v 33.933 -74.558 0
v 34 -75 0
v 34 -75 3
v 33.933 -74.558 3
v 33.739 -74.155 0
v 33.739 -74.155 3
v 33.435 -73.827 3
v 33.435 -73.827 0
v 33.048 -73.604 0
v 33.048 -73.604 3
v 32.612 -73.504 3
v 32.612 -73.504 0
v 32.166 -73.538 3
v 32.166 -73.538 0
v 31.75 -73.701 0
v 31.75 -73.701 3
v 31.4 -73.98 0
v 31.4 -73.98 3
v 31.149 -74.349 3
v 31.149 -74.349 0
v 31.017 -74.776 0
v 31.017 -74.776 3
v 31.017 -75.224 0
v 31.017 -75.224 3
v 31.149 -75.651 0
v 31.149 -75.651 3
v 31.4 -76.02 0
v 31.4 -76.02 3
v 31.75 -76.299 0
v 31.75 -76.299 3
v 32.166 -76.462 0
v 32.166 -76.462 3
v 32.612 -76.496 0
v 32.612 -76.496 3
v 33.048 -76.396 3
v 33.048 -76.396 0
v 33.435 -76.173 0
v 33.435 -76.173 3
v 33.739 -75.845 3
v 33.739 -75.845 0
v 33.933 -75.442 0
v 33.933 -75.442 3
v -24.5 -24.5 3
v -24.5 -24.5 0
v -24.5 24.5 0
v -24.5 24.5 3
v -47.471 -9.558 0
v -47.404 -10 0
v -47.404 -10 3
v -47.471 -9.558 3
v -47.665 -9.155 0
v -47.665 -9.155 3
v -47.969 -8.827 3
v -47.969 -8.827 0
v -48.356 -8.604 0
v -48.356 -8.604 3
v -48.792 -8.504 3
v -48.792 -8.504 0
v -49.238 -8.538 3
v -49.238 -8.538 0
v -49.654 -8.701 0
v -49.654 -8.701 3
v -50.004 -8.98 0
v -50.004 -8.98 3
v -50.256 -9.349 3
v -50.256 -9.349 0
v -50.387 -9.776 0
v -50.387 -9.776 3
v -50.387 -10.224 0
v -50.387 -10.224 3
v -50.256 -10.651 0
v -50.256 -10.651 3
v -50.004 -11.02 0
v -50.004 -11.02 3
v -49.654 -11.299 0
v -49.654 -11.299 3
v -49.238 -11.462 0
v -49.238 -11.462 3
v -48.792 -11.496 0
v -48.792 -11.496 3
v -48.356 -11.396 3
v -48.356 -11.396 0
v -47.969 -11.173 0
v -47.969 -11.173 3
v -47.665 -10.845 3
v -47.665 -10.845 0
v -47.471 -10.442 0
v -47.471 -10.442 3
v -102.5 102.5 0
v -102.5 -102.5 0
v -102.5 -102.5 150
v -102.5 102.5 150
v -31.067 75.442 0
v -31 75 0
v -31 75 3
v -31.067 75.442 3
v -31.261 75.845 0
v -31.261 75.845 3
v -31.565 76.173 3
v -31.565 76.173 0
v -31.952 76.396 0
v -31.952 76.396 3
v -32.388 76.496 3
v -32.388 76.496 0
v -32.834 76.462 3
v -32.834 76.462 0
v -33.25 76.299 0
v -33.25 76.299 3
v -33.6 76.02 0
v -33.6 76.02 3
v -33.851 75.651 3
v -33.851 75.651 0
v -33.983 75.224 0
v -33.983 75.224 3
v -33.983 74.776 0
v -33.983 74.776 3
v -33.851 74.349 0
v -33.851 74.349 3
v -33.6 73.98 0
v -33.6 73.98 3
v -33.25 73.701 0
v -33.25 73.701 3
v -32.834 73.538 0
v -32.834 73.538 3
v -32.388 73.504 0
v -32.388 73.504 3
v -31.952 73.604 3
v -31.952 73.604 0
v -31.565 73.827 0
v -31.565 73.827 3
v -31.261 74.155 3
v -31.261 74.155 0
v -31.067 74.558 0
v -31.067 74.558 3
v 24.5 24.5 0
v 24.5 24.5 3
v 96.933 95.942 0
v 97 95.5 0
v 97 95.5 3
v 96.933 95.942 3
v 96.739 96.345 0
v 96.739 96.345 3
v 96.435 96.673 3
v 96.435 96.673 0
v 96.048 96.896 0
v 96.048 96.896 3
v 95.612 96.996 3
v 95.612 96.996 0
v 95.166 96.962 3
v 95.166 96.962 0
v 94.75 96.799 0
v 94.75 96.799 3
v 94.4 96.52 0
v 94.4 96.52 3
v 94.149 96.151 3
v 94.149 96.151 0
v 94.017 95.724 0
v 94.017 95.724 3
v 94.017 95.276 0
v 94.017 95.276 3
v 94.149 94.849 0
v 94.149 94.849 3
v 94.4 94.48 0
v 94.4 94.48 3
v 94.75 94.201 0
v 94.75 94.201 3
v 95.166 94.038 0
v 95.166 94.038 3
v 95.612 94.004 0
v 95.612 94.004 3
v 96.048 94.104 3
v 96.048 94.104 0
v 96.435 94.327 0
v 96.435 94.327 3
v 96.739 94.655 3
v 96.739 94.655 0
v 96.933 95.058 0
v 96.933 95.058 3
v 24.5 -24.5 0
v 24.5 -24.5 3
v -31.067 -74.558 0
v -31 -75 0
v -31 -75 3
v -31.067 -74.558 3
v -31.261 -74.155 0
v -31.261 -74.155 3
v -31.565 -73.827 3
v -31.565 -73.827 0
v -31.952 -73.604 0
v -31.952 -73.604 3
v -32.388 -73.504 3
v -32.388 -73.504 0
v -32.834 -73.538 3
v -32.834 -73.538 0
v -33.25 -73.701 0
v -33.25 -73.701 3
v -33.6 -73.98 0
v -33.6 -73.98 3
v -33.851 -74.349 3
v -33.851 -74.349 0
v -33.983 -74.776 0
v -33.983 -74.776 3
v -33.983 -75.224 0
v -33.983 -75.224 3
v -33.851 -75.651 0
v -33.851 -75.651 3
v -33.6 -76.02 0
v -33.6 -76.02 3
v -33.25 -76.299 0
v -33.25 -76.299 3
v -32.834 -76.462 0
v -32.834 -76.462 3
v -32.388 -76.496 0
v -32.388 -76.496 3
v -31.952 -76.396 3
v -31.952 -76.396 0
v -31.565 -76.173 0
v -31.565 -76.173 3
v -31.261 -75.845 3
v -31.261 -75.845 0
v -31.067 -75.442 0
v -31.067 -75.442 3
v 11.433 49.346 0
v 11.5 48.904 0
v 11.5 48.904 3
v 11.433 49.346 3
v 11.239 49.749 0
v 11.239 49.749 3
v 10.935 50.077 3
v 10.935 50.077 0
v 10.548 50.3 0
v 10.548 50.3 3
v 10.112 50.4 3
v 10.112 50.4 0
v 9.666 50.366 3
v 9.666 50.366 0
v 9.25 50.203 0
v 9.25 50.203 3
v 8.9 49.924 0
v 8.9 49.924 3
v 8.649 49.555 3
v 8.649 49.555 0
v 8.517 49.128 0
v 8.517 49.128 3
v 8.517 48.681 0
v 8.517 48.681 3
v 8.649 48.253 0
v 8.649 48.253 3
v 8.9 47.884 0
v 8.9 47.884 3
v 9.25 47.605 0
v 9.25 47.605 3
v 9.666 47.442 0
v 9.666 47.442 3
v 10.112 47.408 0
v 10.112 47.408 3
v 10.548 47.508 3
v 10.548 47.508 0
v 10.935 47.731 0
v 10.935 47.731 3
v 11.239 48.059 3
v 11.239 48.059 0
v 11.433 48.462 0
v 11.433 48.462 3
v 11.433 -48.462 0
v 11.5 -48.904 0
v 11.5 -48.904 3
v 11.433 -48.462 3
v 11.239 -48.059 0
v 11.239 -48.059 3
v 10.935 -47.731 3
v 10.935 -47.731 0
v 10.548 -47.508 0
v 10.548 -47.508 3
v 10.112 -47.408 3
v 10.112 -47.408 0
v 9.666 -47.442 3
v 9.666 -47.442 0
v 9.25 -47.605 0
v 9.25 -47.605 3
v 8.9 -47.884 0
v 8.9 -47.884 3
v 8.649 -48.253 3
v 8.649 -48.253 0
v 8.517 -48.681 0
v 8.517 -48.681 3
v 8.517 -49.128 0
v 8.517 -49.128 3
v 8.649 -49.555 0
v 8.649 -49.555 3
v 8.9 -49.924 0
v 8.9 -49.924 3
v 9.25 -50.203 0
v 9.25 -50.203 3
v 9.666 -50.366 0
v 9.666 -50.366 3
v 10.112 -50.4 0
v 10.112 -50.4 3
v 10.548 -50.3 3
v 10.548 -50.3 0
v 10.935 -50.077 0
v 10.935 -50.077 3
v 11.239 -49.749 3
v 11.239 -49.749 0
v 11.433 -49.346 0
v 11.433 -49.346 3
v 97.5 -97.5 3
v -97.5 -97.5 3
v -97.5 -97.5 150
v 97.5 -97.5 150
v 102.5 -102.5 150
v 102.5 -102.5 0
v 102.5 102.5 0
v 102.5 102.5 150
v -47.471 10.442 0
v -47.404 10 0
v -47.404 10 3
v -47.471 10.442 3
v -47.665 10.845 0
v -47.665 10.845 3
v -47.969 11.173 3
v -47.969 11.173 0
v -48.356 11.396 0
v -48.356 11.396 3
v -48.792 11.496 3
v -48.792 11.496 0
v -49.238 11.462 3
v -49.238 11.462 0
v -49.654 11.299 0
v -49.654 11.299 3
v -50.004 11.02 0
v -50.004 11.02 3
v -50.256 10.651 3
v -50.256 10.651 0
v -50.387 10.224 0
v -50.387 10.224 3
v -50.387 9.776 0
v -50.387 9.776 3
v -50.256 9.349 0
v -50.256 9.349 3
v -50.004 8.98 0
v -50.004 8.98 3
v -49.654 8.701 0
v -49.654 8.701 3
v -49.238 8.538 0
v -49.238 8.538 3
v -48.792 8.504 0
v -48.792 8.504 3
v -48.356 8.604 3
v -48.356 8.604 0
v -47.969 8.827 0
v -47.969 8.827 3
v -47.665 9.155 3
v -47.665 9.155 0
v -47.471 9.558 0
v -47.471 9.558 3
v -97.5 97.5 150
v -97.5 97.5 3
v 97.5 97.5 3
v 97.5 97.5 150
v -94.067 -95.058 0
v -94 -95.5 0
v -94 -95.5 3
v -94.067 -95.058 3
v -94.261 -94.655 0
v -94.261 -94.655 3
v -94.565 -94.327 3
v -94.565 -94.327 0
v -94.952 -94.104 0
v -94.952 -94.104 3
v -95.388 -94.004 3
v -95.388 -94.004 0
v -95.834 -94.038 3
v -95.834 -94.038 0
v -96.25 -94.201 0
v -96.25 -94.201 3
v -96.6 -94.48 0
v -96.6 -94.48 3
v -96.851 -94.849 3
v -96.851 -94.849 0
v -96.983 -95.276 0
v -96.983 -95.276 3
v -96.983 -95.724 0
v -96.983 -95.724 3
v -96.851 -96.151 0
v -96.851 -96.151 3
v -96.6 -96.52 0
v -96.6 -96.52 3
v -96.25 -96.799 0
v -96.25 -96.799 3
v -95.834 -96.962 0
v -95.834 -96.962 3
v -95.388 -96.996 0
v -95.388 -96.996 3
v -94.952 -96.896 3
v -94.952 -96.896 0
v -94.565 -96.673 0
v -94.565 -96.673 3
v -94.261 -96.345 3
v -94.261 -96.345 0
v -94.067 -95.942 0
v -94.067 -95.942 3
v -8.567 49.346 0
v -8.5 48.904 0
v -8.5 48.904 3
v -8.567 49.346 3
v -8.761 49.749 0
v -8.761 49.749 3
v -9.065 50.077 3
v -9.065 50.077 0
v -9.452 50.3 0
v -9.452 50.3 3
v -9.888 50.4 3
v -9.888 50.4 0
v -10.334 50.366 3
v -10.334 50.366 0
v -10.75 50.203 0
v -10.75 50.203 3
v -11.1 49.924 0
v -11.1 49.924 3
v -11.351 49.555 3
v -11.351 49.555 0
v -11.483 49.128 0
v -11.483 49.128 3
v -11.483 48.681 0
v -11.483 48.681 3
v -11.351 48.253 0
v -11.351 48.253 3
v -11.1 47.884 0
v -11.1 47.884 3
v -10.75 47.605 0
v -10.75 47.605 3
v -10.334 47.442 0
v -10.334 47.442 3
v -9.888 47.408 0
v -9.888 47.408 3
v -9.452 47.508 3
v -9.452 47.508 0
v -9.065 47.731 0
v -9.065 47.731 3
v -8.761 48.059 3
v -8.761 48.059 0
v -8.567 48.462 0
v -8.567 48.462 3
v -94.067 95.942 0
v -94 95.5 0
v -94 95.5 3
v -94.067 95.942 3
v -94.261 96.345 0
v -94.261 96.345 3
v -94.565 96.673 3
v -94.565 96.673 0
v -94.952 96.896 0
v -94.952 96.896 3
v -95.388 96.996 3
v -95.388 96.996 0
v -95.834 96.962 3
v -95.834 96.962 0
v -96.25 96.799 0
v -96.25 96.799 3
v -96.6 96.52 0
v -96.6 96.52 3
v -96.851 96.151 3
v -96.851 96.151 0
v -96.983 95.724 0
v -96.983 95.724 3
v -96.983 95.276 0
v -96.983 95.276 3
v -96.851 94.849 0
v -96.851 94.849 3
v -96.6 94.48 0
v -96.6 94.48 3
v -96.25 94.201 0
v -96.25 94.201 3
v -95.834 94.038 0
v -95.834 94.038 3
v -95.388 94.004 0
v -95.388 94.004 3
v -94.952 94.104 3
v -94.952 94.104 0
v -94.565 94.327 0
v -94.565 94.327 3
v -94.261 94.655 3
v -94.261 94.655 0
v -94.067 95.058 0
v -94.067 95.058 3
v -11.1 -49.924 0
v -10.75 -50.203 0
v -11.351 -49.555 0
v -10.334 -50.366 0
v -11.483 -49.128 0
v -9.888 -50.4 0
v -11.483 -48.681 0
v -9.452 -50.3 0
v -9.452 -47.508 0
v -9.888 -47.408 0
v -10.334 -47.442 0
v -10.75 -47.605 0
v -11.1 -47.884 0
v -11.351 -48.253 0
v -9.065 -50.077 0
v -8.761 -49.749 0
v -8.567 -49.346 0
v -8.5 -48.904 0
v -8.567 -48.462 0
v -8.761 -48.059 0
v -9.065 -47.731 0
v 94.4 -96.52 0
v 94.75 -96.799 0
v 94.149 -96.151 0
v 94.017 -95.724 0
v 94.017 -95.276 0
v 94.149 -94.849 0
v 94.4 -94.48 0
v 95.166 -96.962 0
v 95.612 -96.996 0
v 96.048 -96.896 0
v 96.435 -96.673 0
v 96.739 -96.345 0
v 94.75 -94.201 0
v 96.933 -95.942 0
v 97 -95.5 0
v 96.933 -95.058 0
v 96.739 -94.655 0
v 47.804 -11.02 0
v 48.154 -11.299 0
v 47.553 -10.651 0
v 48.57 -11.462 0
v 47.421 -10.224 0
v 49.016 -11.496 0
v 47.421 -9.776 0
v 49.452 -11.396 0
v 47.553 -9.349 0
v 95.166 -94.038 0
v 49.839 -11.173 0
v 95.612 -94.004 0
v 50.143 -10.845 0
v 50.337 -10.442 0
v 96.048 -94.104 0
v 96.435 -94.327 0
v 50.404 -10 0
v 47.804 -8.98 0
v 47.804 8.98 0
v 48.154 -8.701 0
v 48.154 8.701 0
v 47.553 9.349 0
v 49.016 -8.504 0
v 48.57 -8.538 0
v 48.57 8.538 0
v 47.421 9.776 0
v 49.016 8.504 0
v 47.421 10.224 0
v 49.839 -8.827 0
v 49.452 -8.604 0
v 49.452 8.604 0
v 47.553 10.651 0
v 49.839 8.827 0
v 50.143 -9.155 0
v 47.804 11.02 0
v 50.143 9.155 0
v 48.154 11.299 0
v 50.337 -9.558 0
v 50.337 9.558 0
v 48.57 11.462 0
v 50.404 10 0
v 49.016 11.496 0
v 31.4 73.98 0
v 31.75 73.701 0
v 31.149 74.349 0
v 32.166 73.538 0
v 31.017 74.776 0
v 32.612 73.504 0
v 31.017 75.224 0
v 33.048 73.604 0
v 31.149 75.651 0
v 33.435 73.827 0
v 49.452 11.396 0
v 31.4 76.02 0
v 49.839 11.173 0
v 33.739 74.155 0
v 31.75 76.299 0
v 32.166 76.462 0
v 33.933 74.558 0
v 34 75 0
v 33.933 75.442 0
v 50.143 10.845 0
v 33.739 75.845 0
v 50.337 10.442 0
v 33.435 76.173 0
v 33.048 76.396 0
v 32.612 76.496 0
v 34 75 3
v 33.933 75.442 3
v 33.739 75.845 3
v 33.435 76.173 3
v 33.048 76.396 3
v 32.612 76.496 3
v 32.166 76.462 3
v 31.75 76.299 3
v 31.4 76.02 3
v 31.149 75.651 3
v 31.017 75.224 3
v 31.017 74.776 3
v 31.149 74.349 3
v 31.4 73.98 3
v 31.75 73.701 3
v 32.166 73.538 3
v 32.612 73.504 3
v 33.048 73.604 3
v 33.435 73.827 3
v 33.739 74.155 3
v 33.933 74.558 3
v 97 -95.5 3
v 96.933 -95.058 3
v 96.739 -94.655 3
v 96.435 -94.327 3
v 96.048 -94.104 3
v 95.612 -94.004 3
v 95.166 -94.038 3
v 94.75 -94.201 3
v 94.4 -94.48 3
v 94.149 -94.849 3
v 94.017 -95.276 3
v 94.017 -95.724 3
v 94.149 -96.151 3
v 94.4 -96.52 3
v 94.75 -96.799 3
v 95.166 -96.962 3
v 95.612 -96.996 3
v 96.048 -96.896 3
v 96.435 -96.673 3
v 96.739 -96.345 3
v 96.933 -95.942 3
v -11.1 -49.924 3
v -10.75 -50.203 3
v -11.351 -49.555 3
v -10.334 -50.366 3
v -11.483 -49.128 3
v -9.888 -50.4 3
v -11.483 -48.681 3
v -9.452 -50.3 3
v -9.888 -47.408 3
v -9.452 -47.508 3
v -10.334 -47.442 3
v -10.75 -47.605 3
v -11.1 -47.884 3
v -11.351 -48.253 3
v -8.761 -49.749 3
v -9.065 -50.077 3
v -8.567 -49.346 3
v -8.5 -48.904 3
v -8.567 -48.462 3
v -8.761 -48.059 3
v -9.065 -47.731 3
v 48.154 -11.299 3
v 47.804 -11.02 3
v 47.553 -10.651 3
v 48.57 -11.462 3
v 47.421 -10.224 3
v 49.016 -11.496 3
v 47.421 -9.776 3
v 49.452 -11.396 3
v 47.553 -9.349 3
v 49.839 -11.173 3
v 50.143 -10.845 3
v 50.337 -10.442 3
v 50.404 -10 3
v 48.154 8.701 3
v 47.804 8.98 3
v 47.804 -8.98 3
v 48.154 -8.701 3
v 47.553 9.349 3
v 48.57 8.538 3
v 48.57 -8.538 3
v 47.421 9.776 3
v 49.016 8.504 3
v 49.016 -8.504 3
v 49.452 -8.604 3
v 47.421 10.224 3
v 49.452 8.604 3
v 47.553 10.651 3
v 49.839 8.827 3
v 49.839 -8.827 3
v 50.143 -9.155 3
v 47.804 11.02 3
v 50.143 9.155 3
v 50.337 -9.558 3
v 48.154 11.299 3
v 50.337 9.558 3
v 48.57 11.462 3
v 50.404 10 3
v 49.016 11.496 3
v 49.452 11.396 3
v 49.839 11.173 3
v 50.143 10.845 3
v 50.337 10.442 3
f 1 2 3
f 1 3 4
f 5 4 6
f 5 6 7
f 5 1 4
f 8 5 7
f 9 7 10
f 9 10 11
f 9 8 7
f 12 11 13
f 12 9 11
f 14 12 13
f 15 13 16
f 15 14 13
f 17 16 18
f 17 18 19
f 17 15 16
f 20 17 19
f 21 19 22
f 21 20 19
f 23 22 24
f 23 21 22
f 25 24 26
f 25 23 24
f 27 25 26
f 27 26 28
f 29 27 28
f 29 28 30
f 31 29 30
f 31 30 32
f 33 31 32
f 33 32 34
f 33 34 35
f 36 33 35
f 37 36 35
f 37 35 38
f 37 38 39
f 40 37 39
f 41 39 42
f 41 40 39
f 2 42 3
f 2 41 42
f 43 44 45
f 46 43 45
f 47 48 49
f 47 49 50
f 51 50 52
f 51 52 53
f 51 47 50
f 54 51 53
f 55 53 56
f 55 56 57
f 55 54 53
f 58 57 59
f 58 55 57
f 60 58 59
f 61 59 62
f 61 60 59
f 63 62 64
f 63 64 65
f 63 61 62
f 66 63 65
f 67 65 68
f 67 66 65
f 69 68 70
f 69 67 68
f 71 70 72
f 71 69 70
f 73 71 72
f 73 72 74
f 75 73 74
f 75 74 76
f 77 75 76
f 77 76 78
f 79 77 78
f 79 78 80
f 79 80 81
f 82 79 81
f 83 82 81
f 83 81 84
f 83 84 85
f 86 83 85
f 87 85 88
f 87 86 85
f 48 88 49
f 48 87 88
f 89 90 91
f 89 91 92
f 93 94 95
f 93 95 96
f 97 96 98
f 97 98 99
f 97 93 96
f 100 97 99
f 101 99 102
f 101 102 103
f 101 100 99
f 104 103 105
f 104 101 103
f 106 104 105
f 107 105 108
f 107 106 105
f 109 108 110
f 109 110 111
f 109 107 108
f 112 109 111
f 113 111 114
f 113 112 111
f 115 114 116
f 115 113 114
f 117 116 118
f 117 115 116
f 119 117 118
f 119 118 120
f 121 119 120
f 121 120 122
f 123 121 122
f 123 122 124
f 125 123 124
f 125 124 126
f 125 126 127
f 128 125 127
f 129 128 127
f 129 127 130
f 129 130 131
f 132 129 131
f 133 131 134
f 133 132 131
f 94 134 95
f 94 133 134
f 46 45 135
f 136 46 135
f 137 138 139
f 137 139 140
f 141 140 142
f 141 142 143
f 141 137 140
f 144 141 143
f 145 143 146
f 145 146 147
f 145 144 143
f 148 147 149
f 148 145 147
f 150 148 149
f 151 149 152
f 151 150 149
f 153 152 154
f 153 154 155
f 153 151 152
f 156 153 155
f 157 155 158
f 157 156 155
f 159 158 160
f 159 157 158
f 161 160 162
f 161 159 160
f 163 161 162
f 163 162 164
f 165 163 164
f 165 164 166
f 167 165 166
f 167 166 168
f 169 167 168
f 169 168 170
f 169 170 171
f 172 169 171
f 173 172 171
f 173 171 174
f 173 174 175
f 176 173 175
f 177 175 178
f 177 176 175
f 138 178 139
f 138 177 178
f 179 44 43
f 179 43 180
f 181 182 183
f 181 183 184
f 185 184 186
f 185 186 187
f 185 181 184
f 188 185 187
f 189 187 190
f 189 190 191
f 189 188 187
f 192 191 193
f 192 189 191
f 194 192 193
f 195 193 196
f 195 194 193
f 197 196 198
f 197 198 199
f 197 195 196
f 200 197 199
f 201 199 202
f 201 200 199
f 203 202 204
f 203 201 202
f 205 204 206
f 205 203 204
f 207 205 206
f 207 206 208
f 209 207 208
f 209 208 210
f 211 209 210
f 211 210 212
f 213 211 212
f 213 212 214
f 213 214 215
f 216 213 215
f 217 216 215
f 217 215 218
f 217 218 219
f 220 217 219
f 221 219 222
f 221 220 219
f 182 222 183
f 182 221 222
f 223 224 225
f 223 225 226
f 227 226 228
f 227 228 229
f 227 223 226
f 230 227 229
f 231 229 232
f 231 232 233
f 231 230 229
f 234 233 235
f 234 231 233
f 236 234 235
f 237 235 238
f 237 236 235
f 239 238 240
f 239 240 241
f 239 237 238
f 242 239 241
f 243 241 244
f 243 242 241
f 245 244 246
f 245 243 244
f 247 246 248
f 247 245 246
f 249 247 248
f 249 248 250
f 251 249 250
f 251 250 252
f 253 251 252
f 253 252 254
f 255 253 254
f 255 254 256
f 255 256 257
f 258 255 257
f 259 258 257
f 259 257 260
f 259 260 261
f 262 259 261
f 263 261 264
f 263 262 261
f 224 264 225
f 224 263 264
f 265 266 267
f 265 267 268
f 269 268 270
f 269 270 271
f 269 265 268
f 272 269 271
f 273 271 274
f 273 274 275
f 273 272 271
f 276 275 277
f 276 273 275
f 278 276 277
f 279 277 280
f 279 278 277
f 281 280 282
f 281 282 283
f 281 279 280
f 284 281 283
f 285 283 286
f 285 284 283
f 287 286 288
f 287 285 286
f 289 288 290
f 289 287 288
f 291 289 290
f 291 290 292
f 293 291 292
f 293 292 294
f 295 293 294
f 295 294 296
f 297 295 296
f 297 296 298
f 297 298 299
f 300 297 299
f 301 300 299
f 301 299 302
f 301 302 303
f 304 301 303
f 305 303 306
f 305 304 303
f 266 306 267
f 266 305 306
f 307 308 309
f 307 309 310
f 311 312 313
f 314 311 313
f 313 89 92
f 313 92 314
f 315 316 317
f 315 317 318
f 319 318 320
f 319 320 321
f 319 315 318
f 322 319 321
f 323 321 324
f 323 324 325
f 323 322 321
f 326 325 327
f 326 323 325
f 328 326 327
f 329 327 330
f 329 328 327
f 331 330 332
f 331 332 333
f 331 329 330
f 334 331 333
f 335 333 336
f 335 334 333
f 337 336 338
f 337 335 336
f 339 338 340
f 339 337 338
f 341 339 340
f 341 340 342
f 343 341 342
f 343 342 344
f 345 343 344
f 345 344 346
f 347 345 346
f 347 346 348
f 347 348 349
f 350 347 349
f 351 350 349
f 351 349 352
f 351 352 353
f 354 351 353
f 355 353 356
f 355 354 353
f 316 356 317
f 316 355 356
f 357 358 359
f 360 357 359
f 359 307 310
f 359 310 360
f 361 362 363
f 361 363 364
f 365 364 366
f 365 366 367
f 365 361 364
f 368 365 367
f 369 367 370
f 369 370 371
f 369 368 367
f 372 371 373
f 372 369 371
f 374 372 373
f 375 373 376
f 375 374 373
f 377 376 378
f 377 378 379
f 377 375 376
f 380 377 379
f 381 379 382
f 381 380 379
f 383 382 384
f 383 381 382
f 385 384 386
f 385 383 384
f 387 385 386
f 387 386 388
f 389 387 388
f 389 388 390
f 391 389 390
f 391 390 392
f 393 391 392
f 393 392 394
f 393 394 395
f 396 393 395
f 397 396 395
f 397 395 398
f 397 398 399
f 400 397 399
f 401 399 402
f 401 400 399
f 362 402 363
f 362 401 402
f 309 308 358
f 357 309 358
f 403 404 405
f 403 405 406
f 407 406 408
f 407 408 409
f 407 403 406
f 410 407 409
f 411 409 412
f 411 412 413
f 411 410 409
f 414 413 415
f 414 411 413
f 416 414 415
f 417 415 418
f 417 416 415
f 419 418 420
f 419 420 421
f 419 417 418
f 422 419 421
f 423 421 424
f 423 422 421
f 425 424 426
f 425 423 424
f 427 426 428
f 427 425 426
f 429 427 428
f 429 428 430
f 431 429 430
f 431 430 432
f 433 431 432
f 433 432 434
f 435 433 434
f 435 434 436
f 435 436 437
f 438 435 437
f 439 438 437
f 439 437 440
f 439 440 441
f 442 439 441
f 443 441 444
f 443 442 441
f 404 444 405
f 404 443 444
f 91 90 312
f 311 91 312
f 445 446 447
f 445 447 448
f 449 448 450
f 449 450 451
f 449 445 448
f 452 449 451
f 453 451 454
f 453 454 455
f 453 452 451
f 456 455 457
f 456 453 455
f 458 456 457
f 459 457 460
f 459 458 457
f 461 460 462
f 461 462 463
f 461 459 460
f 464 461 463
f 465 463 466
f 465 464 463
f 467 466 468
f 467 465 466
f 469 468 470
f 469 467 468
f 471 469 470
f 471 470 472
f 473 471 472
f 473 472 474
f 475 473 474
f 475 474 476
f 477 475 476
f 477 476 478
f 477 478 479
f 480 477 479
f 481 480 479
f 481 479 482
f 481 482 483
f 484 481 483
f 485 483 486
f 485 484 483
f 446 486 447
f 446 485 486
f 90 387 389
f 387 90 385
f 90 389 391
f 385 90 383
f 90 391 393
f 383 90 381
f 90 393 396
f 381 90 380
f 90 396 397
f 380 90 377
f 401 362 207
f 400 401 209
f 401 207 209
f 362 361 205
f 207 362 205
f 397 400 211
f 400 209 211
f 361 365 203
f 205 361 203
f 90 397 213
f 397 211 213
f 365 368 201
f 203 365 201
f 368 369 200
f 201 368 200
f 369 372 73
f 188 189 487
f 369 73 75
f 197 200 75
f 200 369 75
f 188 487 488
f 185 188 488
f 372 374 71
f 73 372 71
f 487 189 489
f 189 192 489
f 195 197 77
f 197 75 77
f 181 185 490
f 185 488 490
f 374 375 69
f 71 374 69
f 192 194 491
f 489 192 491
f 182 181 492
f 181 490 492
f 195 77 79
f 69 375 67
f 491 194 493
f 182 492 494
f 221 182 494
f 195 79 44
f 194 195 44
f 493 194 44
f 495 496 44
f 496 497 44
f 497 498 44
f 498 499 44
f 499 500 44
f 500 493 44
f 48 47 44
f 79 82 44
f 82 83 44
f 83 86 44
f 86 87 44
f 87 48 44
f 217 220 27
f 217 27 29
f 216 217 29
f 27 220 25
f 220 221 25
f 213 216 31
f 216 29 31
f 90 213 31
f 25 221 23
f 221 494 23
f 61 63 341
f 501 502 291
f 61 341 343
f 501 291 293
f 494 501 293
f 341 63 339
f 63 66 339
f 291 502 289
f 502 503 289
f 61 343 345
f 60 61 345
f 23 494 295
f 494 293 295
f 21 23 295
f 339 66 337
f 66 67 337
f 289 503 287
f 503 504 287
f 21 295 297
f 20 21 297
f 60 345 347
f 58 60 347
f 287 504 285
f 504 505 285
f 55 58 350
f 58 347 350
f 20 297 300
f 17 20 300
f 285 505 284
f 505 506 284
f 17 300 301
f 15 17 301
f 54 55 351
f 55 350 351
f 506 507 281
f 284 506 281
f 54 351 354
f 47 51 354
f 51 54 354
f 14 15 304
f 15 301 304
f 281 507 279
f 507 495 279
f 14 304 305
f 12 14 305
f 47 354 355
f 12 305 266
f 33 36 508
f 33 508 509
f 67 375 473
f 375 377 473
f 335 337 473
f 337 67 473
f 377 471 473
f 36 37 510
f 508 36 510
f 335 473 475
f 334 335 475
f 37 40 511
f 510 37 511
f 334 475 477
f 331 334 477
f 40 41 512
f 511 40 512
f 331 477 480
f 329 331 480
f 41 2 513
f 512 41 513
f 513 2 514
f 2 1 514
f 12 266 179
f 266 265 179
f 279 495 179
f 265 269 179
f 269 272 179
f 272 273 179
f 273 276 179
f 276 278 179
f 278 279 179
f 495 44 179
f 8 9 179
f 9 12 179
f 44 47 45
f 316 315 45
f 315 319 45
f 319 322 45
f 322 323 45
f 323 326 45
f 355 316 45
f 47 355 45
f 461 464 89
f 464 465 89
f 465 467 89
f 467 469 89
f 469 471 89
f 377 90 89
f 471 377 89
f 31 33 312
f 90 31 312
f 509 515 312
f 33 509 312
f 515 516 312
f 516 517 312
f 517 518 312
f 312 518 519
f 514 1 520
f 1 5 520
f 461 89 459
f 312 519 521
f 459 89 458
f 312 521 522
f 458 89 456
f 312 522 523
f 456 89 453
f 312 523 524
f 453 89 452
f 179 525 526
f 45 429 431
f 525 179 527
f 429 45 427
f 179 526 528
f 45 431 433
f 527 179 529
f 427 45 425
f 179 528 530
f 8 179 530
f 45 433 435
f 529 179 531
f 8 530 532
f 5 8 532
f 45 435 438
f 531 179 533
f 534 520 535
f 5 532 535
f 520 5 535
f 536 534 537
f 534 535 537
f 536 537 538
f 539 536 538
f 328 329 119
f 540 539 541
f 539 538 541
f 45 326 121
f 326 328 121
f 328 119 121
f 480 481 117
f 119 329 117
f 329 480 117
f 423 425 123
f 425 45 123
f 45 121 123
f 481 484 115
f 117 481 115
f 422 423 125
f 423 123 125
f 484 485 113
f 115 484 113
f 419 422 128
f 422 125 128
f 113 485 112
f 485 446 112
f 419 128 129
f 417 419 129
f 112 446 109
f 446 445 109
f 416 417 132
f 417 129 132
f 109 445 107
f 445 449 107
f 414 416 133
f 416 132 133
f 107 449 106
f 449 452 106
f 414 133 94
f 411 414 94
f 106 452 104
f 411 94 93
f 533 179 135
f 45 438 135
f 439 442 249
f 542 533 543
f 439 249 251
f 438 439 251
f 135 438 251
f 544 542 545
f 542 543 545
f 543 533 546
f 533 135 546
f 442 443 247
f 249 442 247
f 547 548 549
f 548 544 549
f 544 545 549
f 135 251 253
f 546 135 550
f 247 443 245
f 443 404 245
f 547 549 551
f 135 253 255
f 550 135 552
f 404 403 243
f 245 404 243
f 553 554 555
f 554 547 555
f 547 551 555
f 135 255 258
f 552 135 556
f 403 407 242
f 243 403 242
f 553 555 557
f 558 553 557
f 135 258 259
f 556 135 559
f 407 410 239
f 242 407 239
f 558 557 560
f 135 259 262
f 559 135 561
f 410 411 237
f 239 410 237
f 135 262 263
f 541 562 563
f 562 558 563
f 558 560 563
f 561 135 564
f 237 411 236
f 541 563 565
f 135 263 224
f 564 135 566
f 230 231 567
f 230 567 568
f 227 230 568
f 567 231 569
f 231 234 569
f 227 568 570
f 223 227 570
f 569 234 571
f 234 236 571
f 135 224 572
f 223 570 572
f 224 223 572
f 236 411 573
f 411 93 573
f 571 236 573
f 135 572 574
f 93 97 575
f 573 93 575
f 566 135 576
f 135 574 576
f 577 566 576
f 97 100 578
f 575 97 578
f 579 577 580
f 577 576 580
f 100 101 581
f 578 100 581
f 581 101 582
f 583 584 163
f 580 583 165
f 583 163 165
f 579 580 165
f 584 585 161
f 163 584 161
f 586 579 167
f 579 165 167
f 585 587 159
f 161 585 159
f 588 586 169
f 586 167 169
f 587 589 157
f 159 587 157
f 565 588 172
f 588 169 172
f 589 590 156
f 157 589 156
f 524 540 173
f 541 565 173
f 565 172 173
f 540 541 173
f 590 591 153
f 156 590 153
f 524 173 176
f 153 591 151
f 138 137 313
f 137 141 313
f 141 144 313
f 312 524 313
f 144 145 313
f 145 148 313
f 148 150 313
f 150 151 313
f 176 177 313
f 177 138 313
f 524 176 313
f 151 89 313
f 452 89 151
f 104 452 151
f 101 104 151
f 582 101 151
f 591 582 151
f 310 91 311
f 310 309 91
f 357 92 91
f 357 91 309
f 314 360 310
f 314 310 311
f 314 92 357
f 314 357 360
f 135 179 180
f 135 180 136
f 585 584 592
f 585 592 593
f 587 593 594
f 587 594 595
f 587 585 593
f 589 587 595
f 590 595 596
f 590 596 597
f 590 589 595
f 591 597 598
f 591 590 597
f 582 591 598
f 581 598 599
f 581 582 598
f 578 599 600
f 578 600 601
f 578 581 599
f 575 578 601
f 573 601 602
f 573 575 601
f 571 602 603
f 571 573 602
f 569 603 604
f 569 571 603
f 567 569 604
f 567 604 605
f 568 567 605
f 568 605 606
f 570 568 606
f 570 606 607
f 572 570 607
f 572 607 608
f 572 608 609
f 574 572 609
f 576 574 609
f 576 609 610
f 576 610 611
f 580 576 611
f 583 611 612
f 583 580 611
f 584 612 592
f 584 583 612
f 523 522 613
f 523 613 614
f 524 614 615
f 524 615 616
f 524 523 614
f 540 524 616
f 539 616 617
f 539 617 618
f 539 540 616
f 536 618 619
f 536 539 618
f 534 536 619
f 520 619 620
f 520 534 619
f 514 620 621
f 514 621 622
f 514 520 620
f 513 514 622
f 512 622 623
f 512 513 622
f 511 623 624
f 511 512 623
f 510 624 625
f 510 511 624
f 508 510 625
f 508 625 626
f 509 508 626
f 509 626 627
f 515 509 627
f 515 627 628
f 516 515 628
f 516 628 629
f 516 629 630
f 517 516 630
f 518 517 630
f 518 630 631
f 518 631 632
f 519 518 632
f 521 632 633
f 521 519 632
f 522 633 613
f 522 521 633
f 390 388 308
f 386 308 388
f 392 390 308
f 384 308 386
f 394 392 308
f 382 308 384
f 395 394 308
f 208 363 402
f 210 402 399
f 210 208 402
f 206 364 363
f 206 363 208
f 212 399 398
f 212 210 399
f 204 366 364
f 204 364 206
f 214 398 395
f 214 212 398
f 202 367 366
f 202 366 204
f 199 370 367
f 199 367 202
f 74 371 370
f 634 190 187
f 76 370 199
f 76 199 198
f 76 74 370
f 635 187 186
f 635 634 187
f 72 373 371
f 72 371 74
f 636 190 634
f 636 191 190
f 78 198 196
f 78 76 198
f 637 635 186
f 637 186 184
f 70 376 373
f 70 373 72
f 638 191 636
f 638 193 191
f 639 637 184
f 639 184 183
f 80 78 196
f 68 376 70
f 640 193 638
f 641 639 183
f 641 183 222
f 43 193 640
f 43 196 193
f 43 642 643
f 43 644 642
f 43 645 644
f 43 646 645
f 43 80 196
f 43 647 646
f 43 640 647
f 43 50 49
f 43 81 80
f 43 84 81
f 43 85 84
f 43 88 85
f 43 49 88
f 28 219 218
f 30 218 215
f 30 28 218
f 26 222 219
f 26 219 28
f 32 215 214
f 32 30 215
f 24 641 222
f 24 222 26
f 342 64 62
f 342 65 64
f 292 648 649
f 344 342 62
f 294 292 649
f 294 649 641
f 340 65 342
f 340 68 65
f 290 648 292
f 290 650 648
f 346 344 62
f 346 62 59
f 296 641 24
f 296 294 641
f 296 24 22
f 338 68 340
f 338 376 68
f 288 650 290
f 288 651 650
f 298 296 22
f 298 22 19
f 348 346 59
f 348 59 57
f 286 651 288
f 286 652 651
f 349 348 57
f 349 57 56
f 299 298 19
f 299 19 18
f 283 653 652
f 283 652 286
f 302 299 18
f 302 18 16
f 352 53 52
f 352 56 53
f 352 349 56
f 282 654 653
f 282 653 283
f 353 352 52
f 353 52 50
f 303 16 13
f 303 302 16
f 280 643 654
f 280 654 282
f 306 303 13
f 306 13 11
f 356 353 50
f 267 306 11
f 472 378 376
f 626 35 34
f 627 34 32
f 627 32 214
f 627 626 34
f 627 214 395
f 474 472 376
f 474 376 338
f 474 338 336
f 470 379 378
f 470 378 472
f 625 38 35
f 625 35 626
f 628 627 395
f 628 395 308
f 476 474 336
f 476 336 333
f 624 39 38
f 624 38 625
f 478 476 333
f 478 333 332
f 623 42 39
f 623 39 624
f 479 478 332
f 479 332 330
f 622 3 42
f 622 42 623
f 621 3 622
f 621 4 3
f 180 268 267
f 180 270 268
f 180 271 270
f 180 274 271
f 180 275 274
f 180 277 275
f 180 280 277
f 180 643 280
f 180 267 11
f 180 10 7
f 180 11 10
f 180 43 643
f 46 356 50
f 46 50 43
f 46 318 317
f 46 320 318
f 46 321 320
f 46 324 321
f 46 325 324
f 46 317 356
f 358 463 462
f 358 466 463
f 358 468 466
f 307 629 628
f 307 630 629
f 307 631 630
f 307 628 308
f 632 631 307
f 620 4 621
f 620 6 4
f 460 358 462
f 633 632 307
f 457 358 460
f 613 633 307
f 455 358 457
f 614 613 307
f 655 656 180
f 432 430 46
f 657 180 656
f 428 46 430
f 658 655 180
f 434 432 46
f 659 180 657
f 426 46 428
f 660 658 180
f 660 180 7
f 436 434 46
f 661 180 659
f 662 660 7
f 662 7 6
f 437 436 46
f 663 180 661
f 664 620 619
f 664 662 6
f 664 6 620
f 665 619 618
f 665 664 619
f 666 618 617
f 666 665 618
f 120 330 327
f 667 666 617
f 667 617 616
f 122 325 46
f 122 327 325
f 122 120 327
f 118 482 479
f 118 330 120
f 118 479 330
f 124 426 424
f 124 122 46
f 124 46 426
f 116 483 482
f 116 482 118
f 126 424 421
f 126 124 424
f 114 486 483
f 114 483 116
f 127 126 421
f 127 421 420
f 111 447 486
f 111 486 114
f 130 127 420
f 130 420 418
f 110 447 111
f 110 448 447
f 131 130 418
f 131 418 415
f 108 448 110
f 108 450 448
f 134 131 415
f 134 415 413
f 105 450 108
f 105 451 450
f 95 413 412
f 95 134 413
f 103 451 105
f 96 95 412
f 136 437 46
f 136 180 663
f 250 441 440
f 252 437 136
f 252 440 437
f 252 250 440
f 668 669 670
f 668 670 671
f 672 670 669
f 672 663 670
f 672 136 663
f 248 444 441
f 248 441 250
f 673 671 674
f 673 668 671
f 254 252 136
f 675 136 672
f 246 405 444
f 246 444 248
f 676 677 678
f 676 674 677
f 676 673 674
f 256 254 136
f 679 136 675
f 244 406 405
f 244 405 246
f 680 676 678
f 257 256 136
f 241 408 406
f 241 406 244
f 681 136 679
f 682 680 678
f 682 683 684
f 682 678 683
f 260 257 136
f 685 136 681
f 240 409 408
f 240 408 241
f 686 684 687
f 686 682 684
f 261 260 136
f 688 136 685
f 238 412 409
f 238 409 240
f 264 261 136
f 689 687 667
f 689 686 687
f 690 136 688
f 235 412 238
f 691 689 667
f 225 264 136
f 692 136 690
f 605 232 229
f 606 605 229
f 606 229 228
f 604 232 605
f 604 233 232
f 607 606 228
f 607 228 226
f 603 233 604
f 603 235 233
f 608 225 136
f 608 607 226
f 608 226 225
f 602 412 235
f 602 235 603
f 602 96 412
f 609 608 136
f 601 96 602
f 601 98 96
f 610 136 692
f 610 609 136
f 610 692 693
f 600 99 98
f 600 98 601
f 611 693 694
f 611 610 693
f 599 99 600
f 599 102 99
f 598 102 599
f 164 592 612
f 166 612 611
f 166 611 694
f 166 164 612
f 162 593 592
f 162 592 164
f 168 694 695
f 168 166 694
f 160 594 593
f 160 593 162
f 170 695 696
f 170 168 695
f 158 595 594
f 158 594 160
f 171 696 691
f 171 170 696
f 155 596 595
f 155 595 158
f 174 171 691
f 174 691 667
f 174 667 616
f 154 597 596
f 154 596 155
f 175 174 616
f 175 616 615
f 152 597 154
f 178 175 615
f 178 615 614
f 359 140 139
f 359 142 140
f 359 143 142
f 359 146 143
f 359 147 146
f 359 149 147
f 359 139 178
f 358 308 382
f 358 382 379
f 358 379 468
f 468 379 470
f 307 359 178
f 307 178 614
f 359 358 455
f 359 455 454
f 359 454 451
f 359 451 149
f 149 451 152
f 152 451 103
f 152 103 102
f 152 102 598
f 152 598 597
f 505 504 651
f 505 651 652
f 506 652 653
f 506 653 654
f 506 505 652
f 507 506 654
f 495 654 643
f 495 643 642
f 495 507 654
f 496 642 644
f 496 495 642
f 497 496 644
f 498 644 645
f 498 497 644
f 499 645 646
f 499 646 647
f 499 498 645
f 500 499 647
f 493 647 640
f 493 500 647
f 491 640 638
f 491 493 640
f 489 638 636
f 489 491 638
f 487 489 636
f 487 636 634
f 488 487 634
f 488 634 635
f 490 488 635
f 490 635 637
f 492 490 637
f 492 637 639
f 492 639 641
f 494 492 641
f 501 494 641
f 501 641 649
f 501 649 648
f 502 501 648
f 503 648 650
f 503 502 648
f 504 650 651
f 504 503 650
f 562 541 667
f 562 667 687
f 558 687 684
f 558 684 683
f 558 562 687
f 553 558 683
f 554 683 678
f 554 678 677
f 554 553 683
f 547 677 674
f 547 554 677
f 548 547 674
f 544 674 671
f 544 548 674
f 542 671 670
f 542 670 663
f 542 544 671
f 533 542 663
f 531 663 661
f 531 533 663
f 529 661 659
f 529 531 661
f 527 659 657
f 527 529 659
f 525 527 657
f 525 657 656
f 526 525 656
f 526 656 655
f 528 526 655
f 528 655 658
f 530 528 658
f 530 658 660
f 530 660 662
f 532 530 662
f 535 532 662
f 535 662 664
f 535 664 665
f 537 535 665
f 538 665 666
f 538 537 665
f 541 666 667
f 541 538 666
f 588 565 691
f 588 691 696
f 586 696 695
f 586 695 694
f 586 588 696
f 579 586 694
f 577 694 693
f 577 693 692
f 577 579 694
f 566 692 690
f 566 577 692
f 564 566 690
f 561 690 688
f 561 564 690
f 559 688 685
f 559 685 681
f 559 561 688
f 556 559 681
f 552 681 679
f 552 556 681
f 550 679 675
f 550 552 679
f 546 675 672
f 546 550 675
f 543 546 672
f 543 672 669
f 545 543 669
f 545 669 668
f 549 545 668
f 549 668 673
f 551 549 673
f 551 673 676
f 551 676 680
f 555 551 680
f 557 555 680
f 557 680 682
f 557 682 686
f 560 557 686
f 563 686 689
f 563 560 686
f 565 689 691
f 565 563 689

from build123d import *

# Parameters (mm, degrees)
F0_W     = 205
F0_H     = 205
F0_W_2   = 195
F0_H_2   = 195
F1_DEPTH = 150
F0_R     = 1.5
F0_W_3   = 49
F0_H_3   = 49
F2_DEPTH = 3


with BuildPart() as f1:
    # F0 (on Top) → F1 (new body)
    with BuildSketch(Plane.XY):
        Rectangle(F0_W, F0_H)
        Rectangle(F0_W_2, F0_H_2, mode=Mode.SUBTRACT)
    extrude(amount=F1_DEPTH)

    # F0 (on Top) → F2 (join)
    with BuildSketch(Plane.XY):
        Rectangle(F0_W_2, F0_H_2)
        with Locations((-95.5, -95.5)):
            Circle(F0_R, mode=Mode.SUBTRACT)
        with Locations((-32.5, -75)):
            Circle(F0_R, mode=Mode.SUBTRACT)
        with Locations((-10, -48.904069)):
            Circle(F0_R, mode=Mode.SUBTRACT)
        with Locations((-48.904069, -10)):
            Circle(F0_R, mode=Mode.SUBTRACT)
        with Locations((32.5, -75)):
            Circle(F0_R, mode=Mode.SUBTRACT)
        with Locations((95.5, -95.5)):
            Circle(F0_R, mode=Mode.SUBTRACT)
        with Locations((10, -48.904069)):
            Circle(F0_R, mode=Mode.SUBTRACT)
        with Locations((48.904069, -10)):
            Circle(F0_R, mode=Mode.SUBTRACT)
        with Locations((-48.904069, 10)):
            Circle(F0_R, mode=Mode.SUBTRACT)
        with Locations((-10, 48.904069)):
            Circle(F0_R, mode=Mode.SUBTRACT)
        with Locations((-95.5, 95.5)):
            Circle(F0_R, mode=Mode.SUBTRACT)
        with Locations((-32.5, 75)):
            Circle(F0_R, mode=Mode.SUBTRACT)
        Rectangle(F0_W_3, F0_H_3, mode=Mode.SUBTRACT)
        with Locations((48.904069, 10)):
            Circle(F0_R, mode=Mode.SUBTRACT)
        with Locations((10, 48.904069)):
            Circle(F0_R, mode=Mode.SUBTRACT)
        with Locations((32.5, 75)):
            Circle(F0_R, mode=Mode.SUBTRACT)
        with Locations((95.5, 95.5)):
            Circle(F0_R, mode=Mode.SUBTRACT)
    extrude(amount=F2_DEPTH)


solid = f1.part
